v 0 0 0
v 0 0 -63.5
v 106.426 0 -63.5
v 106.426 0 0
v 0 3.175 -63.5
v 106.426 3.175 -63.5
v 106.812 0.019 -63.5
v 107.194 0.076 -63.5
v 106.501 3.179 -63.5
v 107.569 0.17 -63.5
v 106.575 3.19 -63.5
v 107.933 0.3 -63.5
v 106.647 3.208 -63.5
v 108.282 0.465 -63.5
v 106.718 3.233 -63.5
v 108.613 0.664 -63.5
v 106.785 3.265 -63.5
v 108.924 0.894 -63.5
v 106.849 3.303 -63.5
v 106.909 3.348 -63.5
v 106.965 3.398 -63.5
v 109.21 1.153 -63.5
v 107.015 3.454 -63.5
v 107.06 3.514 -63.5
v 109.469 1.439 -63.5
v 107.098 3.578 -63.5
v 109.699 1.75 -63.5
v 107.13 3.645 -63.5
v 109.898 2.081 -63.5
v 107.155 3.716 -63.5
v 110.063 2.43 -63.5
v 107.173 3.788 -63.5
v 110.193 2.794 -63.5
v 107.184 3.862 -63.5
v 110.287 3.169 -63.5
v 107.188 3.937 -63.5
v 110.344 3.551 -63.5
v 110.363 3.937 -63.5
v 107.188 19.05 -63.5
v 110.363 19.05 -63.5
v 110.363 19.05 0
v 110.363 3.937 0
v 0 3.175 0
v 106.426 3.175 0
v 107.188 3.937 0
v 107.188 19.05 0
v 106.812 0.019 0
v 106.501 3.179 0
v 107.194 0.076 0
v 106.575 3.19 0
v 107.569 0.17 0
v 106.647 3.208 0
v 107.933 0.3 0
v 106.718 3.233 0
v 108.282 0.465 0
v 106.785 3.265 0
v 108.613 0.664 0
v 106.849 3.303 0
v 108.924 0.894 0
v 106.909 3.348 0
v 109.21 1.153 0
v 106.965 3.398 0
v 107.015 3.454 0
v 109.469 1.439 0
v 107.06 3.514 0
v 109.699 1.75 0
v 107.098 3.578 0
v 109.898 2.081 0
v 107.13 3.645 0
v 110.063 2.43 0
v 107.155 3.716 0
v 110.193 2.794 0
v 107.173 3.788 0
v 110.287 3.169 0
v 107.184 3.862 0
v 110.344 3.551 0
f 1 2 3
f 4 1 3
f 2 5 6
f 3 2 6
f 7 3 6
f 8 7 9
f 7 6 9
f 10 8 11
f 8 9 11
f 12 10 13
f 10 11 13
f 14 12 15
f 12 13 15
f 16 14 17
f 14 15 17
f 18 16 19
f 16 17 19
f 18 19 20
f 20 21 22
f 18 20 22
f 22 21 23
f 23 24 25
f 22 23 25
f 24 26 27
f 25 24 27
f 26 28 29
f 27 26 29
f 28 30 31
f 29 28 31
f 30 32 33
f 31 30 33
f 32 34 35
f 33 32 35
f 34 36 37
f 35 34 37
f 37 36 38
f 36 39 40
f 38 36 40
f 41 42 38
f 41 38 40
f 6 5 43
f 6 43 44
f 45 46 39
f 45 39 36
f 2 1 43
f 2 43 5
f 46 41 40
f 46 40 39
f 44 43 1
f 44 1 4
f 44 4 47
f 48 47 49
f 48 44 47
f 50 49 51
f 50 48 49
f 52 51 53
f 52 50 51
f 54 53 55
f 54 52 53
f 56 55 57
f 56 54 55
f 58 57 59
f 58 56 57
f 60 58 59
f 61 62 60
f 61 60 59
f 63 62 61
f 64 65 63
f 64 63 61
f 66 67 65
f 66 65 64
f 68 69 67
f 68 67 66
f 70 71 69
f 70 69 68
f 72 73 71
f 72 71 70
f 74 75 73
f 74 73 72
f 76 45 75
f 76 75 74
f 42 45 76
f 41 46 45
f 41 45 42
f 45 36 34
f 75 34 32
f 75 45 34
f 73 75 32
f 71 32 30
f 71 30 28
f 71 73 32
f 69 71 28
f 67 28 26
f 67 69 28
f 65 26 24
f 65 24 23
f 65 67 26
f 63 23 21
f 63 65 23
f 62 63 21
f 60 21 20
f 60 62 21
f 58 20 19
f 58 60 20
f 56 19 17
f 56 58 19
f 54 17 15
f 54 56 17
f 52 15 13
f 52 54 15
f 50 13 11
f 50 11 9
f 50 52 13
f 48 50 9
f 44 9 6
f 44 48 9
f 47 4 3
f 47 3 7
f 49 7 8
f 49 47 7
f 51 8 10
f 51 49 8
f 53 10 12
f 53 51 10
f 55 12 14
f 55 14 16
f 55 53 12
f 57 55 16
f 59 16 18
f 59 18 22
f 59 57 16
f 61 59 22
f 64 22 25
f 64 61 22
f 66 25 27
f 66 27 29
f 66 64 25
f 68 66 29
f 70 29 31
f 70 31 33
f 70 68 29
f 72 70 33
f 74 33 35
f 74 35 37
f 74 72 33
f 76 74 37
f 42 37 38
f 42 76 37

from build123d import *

# Parameters (mm, degrees)
SKETCH1_W           = 106.426
SKETCH1_H           = 63.5
BOSS_EXTRUDE1_DEPTH = 3.175
EDGE_FLANGE1_DEPTH  = 63.5


# Sheet-metal steps are written as plain solids
with BuildPart() as part:
    # Sketch1 → Boss-Extrude1 (new body)
    with BuildSketch(Plane(origin=(0, 0, 0), x_dir=(1, 0, 0), z_dir=(0, 1, 0))):
        with Locations((53.213, 31.75)):
            Rectangle(SKETCH1_W, SKETCH1_H)
    extrude(amount=BOSS_EXTRUDE1_DEPTH)

    # Edge-Flange1 section (across the edge) → Edge-Flange1 (add)
    with BuildSketch(Plane(origin=(107.188, 3.175, 0), x_dir=(-1, 0, 0), z_dir=(0, 0, -1))):
        with BuildLine():
            Line((-3.175, 0.762), (-3.175, 15.875))
            Line((-3.175, 15.875), (0, 15.875))
            Line((0, 15.875), (0, 0.762))
            ThreePointArc((0, 0.762), (0.223184633, 0.223184633), (0.762, 0))
            Line((0.762, 0), (0.762, -3.175))
            ThreePointArc((0.762, -3.175), (-2.021879398, -2.021879398), (-3.175, 0.762))
        make_face()
    extrude(amount=EDGE_FLANGE1_DEPTH)


solid = part.part
